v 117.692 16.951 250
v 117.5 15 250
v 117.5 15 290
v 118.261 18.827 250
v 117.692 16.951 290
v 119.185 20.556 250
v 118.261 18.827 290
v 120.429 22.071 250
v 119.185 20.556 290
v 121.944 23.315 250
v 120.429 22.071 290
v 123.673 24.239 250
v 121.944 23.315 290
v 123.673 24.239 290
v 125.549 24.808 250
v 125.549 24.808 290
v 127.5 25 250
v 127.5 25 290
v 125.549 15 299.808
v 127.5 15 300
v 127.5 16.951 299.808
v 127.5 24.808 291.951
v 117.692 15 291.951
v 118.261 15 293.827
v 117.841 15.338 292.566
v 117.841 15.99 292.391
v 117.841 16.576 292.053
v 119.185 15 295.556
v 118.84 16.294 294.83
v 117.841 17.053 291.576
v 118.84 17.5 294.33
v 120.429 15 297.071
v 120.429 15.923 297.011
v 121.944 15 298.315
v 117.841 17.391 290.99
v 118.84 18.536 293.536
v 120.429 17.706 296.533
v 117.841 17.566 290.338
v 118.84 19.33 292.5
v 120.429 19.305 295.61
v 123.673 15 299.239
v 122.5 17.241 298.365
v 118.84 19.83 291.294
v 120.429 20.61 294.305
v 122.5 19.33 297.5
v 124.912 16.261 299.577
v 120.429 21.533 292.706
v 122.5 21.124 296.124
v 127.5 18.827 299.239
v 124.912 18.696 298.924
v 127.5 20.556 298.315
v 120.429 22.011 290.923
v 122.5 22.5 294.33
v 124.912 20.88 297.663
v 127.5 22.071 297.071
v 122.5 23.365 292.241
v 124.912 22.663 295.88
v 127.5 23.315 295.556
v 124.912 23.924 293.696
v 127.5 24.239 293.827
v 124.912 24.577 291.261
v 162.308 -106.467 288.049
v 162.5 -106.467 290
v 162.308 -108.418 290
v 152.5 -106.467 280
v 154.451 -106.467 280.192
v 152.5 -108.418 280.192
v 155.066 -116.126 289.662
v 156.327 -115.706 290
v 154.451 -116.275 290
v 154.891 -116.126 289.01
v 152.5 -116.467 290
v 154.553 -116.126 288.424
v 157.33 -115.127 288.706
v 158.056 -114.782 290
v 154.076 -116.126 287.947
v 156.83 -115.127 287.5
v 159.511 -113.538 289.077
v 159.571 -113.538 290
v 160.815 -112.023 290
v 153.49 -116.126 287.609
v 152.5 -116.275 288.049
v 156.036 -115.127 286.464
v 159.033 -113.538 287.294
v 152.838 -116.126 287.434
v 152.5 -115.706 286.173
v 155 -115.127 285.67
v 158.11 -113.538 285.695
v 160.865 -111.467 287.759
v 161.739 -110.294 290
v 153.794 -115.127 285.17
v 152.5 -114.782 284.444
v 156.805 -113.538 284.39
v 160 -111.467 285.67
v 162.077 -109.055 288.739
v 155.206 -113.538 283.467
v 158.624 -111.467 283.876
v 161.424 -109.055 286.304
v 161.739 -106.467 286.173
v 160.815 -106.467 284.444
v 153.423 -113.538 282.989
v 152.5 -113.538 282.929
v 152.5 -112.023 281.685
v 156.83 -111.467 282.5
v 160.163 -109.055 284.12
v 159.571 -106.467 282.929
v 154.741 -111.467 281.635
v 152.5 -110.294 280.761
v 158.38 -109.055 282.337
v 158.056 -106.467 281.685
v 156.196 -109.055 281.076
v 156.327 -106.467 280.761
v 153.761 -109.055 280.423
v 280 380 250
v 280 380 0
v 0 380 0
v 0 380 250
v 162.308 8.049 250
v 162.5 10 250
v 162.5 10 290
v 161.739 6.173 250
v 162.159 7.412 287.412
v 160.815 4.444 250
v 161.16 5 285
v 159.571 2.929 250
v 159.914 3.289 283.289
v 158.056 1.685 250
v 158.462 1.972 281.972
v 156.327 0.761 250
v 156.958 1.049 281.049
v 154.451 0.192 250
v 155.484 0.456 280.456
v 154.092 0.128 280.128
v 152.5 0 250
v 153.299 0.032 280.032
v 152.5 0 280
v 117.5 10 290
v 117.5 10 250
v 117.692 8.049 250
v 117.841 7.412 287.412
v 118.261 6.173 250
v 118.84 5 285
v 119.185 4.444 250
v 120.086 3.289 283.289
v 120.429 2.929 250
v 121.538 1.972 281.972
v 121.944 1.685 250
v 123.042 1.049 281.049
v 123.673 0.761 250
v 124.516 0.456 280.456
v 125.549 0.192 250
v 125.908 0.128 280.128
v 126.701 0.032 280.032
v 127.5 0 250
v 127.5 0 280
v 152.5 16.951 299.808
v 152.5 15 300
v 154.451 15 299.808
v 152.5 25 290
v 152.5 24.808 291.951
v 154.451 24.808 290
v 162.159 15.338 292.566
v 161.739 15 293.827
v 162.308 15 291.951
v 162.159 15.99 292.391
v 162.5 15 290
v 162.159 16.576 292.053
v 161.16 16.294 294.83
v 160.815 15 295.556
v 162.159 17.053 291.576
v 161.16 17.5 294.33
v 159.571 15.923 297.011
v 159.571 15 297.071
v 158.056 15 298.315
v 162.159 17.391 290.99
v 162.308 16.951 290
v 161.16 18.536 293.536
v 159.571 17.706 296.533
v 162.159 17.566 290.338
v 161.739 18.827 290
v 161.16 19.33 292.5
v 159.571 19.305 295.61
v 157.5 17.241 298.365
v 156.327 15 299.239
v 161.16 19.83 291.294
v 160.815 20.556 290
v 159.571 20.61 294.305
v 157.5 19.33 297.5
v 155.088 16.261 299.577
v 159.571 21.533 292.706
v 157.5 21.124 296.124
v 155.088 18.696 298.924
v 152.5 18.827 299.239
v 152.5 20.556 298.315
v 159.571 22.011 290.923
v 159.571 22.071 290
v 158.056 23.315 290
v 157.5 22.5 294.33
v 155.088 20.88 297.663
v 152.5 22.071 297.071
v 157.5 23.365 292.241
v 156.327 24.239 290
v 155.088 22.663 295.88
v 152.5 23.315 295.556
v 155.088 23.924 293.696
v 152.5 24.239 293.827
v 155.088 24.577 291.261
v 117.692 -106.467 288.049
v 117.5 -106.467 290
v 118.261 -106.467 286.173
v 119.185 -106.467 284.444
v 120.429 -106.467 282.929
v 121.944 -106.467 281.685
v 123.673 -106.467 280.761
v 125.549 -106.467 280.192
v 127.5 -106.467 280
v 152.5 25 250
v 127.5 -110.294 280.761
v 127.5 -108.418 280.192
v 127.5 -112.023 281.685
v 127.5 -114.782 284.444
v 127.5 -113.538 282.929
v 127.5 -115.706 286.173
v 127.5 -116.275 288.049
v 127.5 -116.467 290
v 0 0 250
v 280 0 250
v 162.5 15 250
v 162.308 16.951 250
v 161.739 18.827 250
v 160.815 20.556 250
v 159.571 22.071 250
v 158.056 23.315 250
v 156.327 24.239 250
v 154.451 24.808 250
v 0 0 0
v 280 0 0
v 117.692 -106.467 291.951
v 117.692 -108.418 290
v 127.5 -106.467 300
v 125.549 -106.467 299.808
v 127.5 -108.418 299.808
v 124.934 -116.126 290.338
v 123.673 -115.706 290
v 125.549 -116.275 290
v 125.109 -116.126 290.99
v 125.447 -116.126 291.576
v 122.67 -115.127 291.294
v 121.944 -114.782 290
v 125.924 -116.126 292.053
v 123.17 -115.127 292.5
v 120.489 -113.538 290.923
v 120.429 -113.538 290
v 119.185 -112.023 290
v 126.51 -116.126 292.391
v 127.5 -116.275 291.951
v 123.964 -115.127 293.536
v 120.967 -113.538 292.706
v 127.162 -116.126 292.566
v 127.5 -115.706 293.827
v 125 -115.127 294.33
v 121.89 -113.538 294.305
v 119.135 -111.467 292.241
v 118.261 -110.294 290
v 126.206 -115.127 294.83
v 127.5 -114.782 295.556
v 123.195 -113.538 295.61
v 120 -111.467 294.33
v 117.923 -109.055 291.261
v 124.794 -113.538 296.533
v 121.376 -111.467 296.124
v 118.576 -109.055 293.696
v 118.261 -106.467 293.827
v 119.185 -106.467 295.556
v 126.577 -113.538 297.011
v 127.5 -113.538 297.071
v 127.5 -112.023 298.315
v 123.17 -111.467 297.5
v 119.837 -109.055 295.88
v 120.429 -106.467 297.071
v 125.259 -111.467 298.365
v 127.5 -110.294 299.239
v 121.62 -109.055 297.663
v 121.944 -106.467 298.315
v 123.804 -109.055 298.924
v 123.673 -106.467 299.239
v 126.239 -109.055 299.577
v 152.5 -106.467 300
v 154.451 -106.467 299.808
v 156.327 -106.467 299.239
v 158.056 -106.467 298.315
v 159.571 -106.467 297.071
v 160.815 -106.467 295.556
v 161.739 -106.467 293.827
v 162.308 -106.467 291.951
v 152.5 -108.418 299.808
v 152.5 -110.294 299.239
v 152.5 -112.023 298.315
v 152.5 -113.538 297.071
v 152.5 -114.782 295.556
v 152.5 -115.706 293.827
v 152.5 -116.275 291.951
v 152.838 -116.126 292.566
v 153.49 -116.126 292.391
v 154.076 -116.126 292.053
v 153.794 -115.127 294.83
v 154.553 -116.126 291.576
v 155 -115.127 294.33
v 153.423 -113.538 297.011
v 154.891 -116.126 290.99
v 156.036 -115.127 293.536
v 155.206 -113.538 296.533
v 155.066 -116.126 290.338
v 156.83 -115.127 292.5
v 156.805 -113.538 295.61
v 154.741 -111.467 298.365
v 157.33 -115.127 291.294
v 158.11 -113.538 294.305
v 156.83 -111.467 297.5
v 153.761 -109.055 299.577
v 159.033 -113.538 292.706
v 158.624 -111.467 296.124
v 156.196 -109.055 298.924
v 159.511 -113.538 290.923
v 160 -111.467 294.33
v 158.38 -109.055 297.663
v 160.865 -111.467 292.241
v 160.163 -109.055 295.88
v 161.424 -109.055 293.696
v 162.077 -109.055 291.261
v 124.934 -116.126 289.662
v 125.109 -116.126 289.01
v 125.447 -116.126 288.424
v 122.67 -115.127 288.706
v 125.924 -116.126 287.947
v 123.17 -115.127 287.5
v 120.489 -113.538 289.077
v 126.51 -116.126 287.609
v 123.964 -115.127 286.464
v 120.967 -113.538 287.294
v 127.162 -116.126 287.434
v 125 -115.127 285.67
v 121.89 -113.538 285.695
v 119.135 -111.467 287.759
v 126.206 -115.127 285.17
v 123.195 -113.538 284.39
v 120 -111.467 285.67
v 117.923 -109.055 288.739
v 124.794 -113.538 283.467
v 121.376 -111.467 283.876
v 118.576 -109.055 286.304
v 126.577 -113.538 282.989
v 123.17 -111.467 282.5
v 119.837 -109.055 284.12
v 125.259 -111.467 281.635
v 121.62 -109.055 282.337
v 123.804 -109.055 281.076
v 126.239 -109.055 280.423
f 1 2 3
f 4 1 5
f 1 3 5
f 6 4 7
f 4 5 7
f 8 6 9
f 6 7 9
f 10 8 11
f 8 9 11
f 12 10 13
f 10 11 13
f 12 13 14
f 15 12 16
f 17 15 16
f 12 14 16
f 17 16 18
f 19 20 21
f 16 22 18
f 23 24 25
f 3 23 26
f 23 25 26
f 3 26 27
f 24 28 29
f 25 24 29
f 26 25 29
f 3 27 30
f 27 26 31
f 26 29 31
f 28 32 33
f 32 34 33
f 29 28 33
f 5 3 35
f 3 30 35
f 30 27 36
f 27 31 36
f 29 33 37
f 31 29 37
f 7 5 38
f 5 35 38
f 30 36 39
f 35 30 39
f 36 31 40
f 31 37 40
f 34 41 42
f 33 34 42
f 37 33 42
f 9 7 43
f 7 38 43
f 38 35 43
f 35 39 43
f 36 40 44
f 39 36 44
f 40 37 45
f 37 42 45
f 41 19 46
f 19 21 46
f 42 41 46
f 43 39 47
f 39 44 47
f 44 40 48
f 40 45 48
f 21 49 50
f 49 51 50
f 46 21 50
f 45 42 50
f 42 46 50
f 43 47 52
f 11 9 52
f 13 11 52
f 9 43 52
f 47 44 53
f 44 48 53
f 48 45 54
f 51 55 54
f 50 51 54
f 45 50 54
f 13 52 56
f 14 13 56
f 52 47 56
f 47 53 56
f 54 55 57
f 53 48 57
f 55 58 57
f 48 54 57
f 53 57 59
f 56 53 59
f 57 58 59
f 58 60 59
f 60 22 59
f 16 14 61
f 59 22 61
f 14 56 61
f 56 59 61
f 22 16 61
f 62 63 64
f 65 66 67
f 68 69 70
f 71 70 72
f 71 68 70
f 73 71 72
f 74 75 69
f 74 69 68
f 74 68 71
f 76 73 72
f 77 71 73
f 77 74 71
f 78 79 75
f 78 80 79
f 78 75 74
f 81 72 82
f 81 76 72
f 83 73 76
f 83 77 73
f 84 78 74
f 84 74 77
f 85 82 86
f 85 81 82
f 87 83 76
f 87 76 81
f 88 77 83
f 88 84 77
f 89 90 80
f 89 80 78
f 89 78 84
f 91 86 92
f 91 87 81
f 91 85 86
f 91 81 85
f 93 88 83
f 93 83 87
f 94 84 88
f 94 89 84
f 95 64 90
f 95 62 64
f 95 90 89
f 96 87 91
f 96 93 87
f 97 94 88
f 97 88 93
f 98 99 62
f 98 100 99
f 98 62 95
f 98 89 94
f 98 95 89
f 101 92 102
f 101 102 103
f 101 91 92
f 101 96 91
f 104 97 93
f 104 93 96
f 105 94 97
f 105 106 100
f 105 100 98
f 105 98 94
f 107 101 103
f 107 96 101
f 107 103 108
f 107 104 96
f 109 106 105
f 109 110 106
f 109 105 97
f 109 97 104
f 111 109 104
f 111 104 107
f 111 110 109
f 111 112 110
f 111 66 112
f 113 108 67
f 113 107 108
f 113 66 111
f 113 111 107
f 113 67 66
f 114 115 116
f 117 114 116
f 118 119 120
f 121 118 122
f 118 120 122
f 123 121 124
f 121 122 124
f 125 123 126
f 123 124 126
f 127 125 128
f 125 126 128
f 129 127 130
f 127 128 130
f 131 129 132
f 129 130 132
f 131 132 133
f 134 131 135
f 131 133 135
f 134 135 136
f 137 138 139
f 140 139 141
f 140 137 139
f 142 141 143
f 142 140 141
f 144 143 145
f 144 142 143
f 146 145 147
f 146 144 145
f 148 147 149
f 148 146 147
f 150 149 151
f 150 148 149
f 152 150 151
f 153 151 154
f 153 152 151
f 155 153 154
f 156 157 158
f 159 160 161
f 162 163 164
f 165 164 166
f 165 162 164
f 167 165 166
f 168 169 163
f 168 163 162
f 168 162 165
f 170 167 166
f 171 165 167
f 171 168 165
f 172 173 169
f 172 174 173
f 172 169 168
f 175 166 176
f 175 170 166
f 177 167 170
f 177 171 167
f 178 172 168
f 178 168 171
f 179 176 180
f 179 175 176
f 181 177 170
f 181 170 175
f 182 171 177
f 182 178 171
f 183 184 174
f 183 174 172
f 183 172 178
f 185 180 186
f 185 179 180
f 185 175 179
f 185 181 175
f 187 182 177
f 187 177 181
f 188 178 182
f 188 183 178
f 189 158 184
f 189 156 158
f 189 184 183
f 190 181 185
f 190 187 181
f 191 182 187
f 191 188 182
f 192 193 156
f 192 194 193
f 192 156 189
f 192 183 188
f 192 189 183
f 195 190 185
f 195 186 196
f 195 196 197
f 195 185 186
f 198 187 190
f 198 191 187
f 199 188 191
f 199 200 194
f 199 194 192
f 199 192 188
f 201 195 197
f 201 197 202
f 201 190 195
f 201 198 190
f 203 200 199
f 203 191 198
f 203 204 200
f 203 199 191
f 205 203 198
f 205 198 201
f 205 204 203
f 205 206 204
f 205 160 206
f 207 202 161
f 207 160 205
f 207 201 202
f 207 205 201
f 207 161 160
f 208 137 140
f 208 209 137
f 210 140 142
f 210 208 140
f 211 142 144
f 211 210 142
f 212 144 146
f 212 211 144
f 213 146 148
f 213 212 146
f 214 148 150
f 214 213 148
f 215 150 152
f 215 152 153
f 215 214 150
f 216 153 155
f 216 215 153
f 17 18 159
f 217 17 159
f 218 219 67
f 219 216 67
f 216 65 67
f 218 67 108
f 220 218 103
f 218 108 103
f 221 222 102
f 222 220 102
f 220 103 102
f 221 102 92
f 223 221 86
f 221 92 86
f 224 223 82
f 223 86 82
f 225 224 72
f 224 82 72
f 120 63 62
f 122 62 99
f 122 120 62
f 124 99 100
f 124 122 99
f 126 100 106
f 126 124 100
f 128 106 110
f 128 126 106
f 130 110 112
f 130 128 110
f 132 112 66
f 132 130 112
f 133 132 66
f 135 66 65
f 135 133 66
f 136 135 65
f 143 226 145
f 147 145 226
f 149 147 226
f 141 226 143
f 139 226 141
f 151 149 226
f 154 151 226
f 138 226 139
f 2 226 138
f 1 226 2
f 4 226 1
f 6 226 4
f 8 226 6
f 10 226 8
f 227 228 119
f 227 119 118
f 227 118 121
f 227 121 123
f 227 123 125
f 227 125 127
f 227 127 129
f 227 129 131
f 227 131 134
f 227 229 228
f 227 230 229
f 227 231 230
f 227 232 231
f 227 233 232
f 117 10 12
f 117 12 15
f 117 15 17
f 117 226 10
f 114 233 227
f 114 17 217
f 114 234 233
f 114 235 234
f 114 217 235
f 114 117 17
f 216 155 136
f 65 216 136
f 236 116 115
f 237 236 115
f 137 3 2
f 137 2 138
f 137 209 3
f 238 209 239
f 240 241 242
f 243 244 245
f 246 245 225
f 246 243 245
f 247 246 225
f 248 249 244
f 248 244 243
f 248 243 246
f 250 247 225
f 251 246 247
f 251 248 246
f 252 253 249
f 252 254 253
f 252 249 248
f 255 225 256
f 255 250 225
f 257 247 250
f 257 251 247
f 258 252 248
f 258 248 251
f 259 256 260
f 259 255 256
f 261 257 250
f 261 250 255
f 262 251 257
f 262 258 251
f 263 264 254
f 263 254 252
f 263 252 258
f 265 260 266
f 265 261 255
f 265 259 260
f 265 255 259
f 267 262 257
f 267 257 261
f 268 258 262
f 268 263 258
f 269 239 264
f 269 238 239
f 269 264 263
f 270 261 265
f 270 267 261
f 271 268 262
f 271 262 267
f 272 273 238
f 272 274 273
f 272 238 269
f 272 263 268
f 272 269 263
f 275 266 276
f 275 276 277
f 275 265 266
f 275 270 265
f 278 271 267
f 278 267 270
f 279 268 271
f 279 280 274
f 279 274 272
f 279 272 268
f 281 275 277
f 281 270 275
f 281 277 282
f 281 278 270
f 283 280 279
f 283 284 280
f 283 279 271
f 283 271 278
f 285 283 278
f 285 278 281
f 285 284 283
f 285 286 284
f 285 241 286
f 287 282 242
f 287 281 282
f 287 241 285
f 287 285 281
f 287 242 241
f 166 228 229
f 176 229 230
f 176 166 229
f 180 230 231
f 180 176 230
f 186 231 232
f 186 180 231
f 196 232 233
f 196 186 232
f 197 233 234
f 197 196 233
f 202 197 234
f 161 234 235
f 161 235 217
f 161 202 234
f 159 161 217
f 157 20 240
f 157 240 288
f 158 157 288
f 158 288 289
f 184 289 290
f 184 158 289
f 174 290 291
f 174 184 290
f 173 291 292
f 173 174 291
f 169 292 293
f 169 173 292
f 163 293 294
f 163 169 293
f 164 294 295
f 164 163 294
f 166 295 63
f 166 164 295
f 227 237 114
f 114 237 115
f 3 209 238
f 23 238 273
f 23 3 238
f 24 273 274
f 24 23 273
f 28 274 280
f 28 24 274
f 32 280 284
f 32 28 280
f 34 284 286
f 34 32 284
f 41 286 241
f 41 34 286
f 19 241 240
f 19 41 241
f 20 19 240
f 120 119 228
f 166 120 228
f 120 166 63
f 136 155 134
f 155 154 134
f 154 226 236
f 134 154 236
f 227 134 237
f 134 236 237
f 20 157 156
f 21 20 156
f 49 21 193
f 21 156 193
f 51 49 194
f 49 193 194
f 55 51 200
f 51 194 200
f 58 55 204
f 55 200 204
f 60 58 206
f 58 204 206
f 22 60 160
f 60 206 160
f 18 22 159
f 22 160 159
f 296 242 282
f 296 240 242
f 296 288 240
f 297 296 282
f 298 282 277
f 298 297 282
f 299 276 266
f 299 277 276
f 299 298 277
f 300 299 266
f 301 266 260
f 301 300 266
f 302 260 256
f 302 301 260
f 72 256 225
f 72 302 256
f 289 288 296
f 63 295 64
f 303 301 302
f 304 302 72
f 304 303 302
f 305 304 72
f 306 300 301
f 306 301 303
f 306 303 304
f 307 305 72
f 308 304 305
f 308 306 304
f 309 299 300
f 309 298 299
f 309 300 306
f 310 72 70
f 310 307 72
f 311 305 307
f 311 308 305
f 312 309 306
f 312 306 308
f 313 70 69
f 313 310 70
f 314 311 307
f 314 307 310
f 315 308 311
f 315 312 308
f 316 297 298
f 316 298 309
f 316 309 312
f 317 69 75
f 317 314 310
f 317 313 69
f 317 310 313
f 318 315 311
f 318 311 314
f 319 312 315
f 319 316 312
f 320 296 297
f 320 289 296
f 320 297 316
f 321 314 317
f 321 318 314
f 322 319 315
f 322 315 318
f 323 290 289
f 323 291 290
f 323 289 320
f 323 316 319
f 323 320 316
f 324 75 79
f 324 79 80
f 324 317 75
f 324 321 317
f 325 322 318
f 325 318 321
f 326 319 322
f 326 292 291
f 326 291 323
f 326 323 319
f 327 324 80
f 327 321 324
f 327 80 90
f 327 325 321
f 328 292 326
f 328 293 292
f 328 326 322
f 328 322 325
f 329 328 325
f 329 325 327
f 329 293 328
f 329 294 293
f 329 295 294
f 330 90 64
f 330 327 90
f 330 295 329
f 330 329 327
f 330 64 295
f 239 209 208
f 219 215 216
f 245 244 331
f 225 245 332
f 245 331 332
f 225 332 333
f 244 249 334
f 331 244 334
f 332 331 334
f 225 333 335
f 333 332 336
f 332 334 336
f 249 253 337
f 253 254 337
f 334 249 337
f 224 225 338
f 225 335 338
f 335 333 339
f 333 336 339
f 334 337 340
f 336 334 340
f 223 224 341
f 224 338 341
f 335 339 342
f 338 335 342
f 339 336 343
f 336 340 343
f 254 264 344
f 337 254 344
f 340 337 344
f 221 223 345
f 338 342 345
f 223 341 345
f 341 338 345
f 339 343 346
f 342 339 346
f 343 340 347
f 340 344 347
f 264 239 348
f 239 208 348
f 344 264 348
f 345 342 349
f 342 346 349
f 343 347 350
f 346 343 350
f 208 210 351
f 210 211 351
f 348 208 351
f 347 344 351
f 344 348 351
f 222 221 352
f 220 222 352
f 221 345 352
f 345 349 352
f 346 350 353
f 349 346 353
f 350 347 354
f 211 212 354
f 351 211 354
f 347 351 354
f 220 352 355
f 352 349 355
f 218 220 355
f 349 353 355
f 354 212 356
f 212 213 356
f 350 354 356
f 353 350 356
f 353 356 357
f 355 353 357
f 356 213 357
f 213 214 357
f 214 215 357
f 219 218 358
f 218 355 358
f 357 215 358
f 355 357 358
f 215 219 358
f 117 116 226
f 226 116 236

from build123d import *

# Parameters (mm, degrees)
F0_W     = 45
F0_H     = 25
F1_DEPTH = 250
F2_START = 250
F2_DEPTH = 50
F3_START = 280
F3_DEPTH = 20
F4_R     = 9.99999


# Not quite as in the source:
# - a fillet or chamfer is up to 0.001 mm smaller than in the source, because OpenCascade refuses the exact size


with BuildPart() as f1:
    # F0 (on Top) → F1 (new body)
    with BuildSketch(Plane.XY):
        Polygon((0, 380), (0, 0), (117.5, 0), (117.5, 25), (162.5, 25), (162.5, 0), (280, 0), (280, 380), align=None)
        with Locations((140, 12.5)):
            Rectangle(F0_W, F0_H)
    extrude(amount=F1_DEPTH)

    # F0 (on Top) → F2 (join)
    with BuildSketch(Plane.XY.offset(F2_START)):
        with Locations((140, 12.5)):
            Rectangle(F0_W, F0_H)
    extrude(amount=F2_DEPTH)

    # F0 (on Top) → F3 (join)
    with BuildSketch(Plane.XY.offset(F3_START)):
        Polygon((162.5, 0), (117.5, 0), (117.5, -116.4670363069), (140, -116.4670363069), (162.5, -116.4670363069), align=None)
    extrude(amount=F3_DEPTH)

    # F4 (radius 10 in the source; OpenCascade refuses exactly that, so slightly less here)
    f4_edges = [f1.edges().sort_by_distance(p)[0] for p in [
        (140, 25, 300),
        (117.5, -45.733518, 300),
        (162.5, -45.733518, 300),
        (162.5, 25, 275),
        (117.5, 25, 275),
        (162.5, -58.233518, 280),
        (117.5, -58.233518, 280),
        (162.5, 0, 265),
        (117.5, 0, 265),
        (117.5, -116.467036, 290),
        (140, -116.467036, 300),
        (162.5, -116.467036, 290),
        (140, -116.467036, 280),
    ]]
    fillet(f4_edges, radius=F4_R)


solid = f1.part
